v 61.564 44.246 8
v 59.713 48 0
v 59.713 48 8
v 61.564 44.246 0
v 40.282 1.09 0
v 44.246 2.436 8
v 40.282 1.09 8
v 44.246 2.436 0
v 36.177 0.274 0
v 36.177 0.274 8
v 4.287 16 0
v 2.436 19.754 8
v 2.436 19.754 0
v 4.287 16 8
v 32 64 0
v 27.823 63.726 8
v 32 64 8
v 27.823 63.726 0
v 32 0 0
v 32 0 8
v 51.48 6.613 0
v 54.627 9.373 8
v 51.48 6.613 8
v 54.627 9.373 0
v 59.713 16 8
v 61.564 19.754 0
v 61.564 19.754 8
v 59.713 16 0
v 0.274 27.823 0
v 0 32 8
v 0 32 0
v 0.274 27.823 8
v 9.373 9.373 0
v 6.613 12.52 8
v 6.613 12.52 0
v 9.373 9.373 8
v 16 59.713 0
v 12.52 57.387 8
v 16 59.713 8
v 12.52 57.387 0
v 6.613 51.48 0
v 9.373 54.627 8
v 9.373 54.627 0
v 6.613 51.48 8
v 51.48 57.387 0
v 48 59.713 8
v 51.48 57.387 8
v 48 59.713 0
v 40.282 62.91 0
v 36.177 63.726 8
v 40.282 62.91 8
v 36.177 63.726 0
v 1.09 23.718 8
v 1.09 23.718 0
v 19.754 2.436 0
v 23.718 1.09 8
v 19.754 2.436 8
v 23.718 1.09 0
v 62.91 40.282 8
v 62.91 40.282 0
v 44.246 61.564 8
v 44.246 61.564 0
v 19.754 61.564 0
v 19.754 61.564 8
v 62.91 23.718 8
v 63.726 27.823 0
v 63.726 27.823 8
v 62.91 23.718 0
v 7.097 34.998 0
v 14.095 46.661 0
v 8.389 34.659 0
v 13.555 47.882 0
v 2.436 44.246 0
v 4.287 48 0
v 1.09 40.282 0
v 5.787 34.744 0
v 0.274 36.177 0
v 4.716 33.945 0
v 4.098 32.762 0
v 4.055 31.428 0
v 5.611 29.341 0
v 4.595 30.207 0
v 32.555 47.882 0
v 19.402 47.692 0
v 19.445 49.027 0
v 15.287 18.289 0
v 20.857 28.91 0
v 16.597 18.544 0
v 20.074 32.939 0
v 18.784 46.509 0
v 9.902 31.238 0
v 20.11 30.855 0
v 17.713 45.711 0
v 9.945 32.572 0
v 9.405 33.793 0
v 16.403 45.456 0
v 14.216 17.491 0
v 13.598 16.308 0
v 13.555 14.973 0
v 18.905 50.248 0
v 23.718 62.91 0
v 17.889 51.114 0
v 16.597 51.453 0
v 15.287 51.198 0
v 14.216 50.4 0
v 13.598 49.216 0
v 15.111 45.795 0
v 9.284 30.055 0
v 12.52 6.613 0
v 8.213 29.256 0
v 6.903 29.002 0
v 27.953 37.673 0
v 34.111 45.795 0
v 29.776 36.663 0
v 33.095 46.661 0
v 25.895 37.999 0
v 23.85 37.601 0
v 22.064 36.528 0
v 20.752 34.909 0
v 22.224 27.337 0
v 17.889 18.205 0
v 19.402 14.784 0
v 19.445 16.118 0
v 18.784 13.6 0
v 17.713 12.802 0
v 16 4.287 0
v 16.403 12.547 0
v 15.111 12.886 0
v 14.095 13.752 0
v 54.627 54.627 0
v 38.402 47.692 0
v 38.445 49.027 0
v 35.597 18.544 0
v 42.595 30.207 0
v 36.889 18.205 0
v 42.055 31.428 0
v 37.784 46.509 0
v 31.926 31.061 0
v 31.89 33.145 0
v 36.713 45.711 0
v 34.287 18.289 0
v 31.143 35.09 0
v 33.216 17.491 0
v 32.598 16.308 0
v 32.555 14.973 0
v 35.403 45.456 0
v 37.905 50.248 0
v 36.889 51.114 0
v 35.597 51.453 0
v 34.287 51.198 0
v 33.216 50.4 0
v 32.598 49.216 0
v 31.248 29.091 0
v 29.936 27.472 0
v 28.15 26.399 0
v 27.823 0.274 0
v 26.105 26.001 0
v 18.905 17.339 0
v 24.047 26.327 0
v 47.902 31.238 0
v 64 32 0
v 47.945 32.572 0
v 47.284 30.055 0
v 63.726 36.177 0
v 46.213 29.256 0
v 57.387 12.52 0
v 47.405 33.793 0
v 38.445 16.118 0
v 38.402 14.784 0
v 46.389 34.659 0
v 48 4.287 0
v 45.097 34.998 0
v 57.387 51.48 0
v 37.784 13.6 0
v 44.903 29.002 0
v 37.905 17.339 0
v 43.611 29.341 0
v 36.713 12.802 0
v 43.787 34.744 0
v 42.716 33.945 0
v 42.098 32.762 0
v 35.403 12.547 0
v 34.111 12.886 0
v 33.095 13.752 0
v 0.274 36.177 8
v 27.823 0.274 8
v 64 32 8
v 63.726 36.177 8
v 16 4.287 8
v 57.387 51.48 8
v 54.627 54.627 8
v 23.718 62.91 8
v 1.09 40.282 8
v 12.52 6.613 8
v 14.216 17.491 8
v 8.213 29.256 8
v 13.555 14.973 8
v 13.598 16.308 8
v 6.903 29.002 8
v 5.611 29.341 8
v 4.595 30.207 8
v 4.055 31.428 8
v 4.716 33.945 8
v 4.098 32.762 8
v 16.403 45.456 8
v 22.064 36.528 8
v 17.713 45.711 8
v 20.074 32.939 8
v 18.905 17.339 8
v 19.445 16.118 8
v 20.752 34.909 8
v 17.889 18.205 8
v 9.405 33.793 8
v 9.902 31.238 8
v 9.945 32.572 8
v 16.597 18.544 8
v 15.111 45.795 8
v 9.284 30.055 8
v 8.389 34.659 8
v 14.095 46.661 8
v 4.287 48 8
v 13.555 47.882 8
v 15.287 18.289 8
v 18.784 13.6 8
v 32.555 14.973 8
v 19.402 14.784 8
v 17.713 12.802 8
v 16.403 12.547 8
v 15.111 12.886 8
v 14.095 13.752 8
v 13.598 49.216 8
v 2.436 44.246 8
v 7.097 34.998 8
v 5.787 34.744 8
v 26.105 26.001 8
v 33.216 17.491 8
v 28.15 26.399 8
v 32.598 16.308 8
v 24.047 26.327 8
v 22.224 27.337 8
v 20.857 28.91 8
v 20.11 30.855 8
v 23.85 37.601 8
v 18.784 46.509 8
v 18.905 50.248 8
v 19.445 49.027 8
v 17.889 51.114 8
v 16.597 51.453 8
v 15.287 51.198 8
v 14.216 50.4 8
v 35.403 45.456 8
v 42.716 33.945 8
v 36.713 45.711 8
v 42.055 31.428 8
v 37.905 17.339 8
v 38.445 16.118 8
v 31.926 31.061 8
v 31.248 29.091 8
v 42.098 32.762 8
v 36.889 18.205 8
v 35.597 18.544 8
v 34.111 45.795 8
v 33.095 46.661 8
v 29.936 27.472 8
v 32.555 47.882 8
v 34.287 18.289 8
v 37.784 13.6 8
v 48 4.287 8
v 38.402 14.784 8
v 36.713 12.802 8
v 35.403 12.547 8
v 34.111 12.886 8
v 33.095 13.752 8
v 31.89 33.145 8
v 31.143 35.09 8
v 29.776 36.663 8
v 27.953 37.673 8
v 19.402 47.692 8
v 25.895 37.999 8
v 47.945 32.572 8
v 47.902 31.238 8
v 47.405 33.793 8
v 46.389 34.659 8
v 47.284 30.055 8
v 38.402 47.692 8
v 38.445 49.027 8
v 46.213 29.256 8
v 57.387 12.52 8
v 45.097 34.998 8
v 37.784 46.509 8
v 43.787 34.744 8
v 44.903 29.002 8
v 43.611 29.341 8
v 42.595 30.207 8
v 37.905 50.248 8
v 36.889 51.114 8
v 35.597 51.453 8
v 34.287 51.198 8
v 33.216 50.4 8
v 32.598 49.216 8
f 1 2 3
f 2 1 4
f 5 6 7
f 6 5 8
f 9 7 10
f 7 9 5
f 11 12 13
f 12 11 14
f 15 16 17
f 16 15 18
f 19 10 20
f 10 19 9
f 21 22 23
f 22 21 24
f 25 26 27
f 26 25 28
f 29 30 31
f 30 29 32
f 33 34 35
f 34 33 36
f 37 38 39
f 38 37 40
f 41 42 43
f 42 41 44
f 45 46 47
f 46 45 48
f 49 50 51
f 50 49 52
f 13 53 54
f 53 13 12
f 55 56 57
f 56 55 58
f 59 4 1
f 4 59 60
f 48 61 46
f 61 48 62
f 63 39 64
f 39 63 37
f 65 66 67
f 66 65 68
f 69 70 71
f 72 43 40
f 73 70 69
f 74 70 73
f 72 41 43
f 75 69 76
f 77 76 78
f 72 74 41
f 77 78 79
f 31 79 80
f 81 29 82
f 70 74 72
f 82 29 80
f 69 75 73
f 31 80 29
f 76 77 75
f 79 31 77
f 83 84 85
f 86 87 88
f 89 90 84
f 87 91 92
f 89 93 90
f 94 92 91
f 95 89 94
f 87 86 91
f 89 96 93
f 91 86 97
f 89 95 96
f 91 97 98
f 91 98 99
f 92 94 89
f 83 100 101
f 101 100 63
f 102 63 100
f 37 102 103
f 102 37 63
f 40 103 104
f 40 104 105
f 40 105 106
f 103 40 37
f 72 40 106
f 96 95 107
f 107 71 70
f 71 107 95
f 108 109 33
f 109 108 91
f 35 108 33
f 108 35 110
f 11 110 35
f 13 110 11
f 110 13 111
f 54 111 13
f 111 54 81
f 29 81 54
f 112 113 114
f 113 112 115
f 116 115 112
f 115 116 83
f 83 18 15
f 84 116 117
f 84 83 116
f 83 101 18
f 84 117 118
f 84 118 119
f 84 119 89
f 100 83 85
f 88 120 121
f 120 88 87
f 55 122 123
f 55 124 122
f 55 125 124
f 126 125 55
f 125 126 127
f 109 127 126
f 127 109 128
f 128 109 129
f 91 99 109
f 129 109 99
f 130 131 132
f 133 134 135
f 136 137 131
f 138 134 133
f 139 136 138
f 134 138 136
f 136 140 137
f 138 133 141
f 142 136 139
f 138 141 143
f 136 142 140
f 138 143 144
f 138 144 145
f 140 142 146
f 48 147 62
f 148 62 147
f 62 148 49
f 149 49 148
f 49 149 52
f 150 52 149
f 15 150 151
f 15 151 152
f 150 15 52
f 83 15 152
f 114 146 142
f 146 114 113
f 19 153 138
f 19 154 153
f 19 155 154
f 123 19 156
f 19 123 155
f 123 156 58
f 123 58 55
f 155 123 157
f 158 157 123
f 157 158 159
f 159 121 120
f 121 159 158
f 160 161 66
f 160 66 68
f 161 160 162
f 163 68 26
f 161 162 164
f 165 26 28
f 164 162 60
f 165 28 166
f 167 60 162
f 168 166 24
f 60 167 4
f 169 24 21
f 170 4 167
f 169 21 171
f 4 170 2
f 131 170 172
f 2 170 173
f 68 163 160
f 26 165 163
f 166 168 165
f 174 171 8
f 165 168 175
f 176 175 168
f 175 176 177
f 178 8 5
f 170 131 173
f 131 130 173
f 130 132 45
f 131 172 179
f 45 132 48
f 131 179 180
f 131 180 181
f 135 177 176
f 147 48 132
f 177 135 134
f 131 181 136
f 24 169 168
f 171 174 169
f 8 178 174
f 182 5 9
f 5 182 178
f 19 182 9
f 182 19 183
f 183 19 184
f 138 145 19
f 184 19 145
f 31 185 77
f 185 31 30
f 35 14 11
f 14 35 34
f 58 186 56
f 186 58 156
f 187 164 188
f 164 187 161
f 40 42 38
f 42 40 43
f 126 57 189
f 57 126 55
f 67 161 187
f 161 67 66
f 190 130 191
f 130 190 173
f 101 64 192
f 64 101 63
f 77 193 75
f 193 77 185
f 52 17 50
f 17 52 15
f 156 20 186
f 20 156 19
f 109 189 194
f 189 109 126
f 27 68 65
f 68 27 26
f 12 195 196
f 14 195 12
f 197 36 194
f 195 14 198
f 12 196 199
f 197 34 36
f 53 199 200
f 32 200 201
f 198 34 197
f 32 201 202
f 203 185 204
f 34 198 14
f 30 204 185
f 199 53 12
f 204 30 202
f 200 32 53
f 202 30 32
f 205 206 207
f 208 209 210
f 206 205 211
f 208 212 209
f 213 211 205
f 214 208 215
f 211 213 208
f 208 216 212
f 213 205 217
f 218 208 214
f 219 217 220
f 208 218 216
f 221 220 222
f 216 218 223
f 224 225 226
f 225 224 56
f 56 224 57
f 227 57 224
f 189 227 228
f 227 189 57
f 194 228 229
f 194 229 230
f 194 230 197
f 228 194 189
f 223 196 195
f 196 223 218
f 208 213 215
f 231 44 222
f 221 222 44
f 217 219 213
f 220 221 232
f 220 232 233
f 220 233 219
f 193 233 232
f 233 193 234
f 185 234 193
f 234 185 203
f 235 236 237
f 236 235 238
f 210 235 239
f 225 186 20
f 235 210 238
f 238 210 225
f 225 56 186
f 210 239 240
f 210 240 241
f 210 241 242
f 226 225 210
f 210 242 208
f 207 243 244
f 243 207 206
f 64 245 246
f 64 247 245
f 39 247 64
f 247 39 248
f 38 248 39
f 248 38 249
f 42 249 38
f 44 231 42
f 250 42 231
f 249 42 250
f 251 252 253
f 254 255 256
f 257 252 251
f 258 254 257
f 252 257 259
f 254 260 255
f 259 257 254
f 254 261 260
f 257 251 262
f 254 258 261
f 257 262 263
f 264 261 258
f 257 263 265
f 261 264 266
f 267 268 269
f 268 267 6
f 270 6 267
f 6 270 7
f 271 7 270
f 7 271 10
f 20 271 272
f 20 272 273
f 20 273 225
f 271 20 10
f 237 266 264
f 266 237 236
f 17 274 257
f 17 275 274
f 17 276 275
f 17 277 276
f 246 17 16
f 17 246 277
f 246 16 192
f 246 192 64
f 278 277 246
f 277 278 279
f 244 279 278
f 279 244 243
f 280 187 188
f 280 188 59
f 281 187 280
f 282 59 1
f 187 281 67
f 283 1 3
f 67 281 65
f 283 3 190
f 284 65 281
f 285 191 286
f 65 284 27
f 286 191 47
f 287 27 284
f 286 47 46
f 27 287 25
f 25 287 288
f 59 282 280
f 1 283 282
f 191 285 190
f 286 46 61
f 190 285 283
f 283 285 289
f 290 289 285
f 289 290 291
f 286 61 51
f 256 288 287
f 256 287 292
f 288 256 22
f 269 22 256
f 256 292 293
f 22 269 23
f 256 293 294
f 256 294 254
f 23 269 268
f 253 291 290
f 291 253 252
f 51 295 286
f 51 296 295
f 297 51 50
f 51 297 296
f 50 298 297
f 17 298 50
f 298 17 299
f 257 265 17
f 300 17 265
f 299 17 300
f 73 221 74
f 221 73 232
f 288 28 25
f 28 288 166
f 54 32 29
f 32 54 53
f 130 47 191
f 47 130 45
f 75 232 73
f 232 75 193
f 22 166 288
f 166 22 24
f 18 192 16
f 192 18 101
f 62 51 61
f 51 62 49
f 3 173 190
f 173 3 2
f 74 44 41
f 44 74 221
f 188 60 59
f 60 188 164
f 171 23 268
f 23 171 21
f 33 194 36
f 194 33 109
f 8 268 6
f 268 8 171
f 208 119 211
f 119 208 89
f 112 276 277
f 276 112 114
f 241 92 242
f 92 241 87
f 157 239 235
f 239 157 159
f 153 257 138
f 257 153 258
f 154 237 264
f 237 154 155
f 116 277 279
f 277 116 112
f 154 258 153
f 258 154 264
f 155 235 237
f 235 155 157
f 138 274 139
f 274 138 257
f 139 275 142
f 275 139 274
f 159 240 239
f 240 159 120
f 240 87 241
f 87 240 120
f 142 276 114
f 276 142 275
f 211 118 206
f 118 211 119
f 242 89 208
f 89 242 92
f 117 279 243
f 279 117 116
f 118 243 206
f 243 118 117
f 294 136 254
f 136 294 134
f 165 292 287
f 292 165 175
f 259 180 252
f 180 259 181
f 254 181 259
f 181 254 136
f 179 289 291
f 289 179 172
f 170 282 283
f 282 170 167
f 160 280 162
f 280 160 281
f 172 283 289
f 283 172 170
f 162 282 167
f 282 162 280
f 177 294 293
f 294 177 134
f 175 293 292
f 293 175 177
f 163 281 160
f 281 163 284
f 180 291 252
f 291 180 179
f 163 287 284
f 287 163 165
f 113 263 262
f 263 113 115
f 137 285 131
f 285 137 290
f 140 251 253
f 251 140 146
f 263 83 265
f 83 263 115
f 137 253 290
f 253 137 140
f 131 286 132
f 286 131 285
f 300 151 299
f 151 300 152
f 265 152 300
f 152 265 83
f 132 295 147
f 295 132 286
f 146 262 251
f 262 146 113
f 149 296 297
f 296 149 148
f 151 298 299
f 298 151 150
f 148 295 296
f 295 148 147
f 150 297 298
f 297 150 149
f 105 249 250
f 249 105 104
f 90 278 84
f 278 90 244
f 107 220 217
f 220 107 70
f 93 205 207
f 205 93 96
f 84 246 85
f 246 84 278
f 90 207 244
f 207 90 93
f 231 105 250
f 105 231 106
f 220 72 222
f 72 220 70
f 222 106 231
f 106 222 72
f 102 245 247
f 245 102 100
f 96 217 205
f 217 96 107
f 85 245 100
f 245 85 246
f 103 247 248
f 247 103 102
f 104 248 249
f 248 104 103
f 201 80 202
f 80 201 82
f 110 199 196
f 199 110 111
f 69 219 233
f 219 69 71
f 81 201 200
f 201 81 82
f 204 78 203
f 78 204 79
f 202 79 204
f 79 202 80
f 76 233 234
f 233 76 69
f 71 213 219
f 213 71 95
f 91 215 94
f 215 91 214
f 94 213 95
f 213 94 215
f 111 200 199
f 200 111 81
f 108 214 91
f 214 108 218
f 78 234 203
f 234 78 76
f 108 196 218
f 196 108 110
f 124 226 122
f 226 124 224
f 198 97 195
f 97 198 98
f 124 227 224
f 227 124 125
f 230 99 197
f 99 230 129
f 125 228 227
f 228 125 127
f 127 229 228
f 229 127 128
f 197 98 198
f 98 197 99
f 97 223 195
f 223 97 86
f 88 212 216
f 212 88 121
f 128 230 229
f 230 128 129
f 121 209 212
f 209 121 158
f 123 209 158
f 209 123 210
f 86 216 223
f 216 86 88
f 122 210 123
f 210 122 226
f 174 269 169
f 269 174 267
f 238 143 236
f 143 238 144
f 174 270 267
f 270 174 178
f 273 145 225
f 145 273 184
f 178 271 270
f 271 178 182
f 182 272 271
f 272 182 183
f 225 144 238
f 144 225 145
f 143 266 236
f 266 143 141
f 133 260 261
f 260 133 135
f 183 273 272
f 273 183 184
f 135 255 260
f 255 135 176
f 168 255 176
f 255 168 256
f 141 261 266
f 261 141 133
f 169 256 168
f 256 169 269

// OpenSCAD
$fn = 32;

// ----------------------------------------------------------------------
// Cam plate: eccentric cam, base R32
// ----------------------------------------------------------------------

// --- parameters (mm) ---
base_r = 32;              // base circle radius
lobe_h = 8;               // cam lobe rise
bore_r = 6;               // shaft bore radius
plate_t = 8;              // plate thickness, Z (extrusion height)
ecc = 6;                  // disc eccentricity
ring_r = 19;              // lightening ring radius
bolt_r = 3;               // lightening hole radius

profile = [[64, 32], [63.726, 36.177], [62.91, 40.282], [61.564, 44.246], [59.713, 48], [57.387, 51.48], [54.627, 54.627], [51.48, 57.387], [48, 59.713], [44.246, 61.564], [40.282, 62.91], [36.177, 63.726], [32, 64], [27.823, 63.726], [23.718, 62.91], [19.754, 61.564], [16, 59.713], [12.52, 57.387], [9.373, 54.627], [6.613, 51.48], [4.287, 48], [2.436, 44.246], [1.09, 40.282], [0.274, 36.177], [0, 32], [0.274, 27.823], [1.09, 23.718], [2.436, 19.754], [4.287, 16], [6.613, 12.52], [9.373, 9.373], [12.52, 6.613], [16, 4.287], [19.754, 2.436], [23.718, 1.09], [27.823, 0.274], [32, 0], [36.177, 0.274], [40.282, 1.09], [44.246, 2.436], [48, 4.287], [51.48, 6.613], [54.627, 9.373], [57.387, 12.52], [59.713, 16], [61.564, 19.754], [62.91, 23.718], [63.726, 27.823]];  // primary outline, 48 points, counter clockwise
void_1 = [[31.89, 33.145], [31.143, 35.09], [29.776, 36.663], [27.953, 37.673], [25.895, 37.999], [23.85, 37.601], [22.064, 36.528], [20.752, 34.909], [20.074, 32.939], [20.11, 30.855], [20.857, 28.91], [22.224, 27.337], [24.047, 26.327], [26.105, 26.001], [28.15, 26.399], [29.936, 27.472], [31.248, 29.091], [31.926, 31.061]];  // shaft bore, 18 points
void_2 = [[47.945, 32.572], [47.405, 33.793], [46.389, 34.659], [45.097, 34.998], [43.787, 34.744], [42.716, 33.945], [42.098, 32.762], [42.055, 31.428], [42.595, 30.207], [43.611, 29.341], [44.903, 29.002], [46.213, 29.256], [47.284, 30.055], [47.902, 31.238]];  // lightening hole 1, 14 points
void_3 = [[38.445, 49.027], [37.905, 50.248], [36.889, 51.114], [35.597, 51.453], [34.287, 51.198], [33.216, 50.4], [32.598, 49.216], [32.555, 47.882], [33.095, 46.661], [34.111, 45.795], [35.403, 45.456], [36.713, 45.711], [37.784, 46.509], [38.402, 47.692]];  // lightening hole 2, 14 points
void_4 = [[19.445, 49.027], [18.905, 50.248], [17.889, 51.114], [16.597, 51.453], [15.287, 51.198], [14.216, 50.4], [13.598, 49.216], [13.555, 47.882], [14.095, 46.661], [15.111, 45.795], [16.403, 45.456], [17.713, 45.711], [18.784, 46.509], [19.402, 47.692]];  // lightening hole 3, 14 points
void_5 = [[9.945, 32.572], [9.405, 33.793], [8.389, 34.659], [7.097, 34.998], [5.787, 34.744], [4.716, 33.945], [4.098, 32.762], [4.055, 31.428], [4.595, 30.207], [5.611, 29.341], [6.903, 29.002], [8.213, 29.256], [9.284, 30.055], [9.902, 31.238]];  // lightening hole 4, 14 points
void_6 = [[19.445, 16.118], [18.905, 17.339], [17.889, 18.205], [16.597, 18.544], [15.287, 18.289], [14.216, 17.491], [13.598, 16.308], [13.555, 14.973], [14.095, 13.752], [15.111, 12.886], [16.403, 12.547], [17.713, 12.802], [18.784, 13.6], [19.402, 14.784]];  // lightening hole 5, 14 points
void_7 = [[38.445, 16.118], [37.905, 17.339], [36.889, 18.205], [35.597, 18.544], [34.287, 18.289], [33.216, 17.491], [32.598, 16.308], [32.555, 14.973], [33.095, 13.752], [34.111, 12.886], [35.403, 12.547], [36.713, 12.802], [37.784, 13.6], [38.402, 14.784]];  // lightening hole 6, 14 points

// --- the one profile operation ---
difference() {
  linear_extrude(height = plate_t) polygon(points = profile);
  translate([0, 0, -1])
    linear_extrude(height = plate_t + 2) polygon(points = void_1);
  translate([0, 0, -1])
    linear_extrude(height = plate_t + 2) polygon(points = void_2);
  translate([0, 0, -1])
    linear_extrude(height = plate_t + 2) polygon(points = void_3);
  translate([0, 0, -1])
    linear_extrude(height = plate_t + 2) polygon(points = void_4);
  translate([0, 0, -1])
    linear_extrude(height = plate_t + 2) polygon(points = void_5);
  translate([0, 0, -1])
    linear_extrude(height = plate_t + 2) polygon(points = void_6);
  translate([0, 0, -1])
    linear_extrude(height = plate_t + 2) polygon(points = void_7);
}
